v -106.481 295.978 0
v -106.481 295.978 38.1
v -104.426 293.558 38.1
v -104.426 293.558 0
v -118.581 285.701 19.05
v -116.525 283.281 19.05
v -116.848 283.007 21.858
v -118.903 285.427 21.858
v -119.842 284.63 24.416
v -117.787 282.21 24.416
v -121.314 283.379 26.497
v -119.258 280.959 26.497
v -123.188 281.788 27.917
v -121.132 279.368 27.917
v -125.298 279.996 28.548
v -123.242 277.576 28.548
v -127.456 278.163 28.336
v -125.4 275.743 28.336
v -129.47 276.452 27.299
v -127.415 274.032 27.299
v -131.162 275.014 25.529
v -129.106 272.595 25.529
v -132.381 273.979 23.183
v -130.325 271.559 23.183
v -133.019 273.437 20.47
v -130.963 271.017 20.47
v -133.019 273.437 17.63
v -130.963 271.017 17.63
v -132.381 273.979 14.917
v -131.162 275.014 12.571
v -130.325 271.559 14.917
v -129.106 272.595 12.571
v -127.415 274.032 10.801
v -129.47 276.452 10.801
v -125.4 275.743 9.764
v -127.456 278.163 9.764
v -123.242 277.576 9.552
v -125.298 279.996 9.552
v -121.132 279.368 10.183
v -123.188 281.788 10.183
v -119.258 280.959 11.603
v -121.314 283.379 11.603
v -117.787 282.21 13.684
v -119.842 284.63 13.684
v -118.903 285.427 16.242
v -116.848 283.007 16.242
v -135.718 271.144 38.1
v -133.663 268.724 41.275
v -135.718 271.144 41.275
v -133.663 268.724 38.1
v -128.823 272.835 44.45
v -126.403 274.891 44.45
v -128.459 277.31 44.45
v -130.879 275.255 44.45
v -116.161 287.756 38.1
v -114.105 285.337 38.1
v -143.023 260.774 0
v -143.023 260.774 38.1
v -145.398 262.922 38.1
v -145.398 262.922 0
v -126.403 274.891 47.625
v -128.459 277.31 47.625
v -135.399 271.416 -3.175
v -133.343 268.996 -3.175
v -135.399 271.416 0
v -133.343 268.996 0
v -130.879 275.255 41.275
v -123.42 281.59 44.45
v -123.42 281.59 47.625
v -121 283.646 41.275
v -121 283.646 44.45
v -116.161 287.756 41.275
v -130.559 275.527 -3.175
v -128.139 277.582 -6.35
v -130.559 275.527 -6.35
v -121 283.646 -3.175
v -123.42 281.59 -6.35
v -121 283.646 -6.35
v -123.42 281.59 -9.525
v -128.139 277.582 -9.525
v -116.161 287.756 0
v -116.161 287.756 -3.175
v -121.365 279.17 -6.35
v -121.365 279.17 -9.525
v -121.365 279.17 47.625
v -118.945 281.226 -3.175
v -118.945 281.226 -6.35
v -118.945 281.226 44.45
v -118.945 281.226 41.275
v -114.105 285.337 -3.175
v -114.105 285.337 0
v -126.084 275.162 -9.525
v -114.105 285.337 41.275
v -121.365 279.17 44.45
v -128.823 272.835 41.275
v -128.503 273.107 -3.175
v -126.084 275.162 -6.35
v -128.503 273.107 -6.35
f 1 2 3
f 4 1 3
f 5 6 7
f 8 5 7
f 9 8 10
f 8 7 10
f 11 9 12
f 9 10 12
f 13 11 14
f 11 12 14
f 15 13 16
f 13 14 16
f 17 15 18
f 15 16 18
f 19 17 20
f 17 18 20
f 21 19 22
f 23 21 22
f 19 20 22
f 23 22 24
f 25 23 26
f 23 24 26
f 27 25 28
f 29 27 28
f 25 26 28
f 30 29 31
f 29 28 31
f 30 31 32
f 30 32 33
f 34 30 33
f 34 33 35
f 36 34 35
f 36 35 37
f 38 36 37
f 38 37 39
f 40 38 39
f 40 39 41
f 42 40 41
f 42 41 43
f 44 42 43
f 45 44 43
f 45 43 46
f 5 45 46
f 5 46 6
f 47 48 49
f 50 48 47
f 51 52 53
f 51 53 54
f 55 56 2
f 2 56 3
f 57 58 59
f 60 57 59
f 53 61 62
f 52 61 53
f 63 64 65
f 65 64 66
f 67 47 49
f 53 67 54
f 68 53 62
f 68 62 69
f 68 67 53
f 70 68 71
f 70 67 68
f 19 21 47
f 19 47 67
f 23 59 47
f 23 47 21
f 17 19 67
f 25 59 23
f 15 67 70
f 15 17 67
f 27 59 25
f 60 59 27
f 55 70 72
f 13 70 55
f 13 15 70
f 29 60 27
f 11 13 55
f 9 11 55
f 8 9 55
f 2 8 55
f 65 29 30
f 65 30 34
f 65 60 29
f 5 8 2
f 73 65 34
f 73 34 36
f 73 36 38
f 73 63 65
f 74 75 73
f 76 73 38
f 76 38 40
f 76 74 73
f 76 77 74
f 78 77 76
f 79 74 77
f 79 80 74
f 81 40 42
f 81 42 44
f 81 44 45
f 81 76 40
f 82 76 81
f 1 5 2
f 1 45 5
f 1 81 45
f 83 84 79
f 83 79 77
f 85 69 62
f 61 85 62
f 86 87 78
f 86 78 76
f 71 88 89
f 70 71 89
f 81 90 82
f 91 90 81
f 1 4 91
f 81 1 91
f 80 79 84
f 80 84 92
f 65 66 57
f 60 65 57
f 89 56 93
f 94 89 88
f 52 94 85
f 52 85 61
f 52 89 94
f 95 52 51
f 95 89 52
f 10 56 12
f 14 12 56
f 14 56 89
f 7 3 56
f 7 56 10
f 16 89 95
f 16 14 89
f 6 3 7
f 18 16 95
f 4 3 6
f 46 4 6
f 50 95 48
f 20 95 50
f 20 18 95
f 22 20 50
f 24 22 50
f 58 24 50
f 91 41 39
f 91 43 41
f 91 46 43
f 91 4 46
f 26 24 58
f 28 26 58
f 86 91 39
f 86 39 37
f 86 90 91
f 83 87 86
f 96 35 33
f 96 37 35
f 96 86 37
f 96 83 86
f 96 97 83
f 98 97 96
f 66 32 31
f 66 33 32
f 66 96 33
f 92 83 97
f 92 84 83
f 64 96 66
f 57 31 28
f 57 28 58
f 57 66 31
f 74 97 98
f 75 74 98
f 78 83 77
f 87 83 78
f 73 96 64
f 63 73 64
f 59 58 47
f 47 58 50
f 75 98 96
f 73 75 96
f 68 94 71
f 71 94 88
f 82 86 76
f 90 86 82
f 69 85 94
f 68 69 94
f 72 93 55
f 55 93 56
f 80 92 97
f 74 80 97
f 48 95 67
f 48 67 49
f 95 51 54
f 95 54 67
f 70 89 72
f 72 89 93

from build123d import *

# Parameters (mm, degrees)
BOSS_EXTRUDE1_DEPTH      = 47.625
BOSS_EXTRUDE1_DEPTH_BACK = 9.525
SKETCH2_R                = 9.525
CUT_EXTRUDE1_DEPTH       = 122.738617419


with BuildPart() as part:
    # Sketch1 → Boss-Extrude1 (new, two sides: drawn at the far end of the back side and taken through both)
    with BuildSketch(Plane.XY.offset(-BOSS_EXTRUDE1_DEPTH_BACK)):
        Polygon((-104.425717212, 293.558329543), (-143.022728413, 260.774121234), (-145.397980675, 262.922347723), (-106.481154517, 295.978206086), align=None)
    extrude(amount=BOSS_EXTRUDE1_DEPTH + BOSS_EXTRUDE1_DEPTH_BACK)

    # Sketch2 → Cut-Extrude1 (cut, through all)
    with BuildSketch(Plane(origin=(-188.610450601, 222.052019857, 0), x_dir=(0.762165840447724, 0.6473818283321017, 0), z_dir=(0.6473818283321017, -0.762165840447724, 0))):
        with Locations((85.054613578, 19.05)):
            Circle(SKETCH2_R)
        Polygon((110.454613578, -9.525), (88.229613578, -9.525), (88.229613578, -6.349999999), (91.404613578, -6.349999999), (91.404613578, -3.175), (97.754613578, -3.175), (97.754613578, 0), (110.454613578, 0), (113.679871945, 0), (113.679871945, -9.525), align=None)
        Polygon((59.813389382, -9.525), (82.038389382, -9.525), (82.038389382, -6.349999999), (78.863389382, -6.349999999), (78.863389382, -3.175), (72.513389382, -3.175), (72.513389382, 0), (59.813389382, 0), (54.830807426, 0), (54.830807426, -9.525), align=None)
        Polygon((110.454613578, 38.1), (118.192353476, 38.1), (118.192353476, 47.625), (110.454613578, 47.625), (88.229613578, 47.625), (88.229613578, 44.449999999), (91.404613578, 44.449999999), (91.404613578, 41.275), (97.754613578, 41.275), (97.754613578, 38.1), align=None)
        Polygon((59.393776038, 38.1), (50.339137781, 38.1), (50.339137781, 47.625), (59.393776038, 47.625), (81.618776038, 47.625), (81.618776038, 44.449999999), (78.443776038, 44.449999999), (78.443776038, 41.275), (72.093776038, 41.275), (72.093776038, 38.1), align=None)
    extrude(amount=-CUT_EXTRUDE1_DEPTH, mode=Mode.SUBTRACT)


solid = part.part
